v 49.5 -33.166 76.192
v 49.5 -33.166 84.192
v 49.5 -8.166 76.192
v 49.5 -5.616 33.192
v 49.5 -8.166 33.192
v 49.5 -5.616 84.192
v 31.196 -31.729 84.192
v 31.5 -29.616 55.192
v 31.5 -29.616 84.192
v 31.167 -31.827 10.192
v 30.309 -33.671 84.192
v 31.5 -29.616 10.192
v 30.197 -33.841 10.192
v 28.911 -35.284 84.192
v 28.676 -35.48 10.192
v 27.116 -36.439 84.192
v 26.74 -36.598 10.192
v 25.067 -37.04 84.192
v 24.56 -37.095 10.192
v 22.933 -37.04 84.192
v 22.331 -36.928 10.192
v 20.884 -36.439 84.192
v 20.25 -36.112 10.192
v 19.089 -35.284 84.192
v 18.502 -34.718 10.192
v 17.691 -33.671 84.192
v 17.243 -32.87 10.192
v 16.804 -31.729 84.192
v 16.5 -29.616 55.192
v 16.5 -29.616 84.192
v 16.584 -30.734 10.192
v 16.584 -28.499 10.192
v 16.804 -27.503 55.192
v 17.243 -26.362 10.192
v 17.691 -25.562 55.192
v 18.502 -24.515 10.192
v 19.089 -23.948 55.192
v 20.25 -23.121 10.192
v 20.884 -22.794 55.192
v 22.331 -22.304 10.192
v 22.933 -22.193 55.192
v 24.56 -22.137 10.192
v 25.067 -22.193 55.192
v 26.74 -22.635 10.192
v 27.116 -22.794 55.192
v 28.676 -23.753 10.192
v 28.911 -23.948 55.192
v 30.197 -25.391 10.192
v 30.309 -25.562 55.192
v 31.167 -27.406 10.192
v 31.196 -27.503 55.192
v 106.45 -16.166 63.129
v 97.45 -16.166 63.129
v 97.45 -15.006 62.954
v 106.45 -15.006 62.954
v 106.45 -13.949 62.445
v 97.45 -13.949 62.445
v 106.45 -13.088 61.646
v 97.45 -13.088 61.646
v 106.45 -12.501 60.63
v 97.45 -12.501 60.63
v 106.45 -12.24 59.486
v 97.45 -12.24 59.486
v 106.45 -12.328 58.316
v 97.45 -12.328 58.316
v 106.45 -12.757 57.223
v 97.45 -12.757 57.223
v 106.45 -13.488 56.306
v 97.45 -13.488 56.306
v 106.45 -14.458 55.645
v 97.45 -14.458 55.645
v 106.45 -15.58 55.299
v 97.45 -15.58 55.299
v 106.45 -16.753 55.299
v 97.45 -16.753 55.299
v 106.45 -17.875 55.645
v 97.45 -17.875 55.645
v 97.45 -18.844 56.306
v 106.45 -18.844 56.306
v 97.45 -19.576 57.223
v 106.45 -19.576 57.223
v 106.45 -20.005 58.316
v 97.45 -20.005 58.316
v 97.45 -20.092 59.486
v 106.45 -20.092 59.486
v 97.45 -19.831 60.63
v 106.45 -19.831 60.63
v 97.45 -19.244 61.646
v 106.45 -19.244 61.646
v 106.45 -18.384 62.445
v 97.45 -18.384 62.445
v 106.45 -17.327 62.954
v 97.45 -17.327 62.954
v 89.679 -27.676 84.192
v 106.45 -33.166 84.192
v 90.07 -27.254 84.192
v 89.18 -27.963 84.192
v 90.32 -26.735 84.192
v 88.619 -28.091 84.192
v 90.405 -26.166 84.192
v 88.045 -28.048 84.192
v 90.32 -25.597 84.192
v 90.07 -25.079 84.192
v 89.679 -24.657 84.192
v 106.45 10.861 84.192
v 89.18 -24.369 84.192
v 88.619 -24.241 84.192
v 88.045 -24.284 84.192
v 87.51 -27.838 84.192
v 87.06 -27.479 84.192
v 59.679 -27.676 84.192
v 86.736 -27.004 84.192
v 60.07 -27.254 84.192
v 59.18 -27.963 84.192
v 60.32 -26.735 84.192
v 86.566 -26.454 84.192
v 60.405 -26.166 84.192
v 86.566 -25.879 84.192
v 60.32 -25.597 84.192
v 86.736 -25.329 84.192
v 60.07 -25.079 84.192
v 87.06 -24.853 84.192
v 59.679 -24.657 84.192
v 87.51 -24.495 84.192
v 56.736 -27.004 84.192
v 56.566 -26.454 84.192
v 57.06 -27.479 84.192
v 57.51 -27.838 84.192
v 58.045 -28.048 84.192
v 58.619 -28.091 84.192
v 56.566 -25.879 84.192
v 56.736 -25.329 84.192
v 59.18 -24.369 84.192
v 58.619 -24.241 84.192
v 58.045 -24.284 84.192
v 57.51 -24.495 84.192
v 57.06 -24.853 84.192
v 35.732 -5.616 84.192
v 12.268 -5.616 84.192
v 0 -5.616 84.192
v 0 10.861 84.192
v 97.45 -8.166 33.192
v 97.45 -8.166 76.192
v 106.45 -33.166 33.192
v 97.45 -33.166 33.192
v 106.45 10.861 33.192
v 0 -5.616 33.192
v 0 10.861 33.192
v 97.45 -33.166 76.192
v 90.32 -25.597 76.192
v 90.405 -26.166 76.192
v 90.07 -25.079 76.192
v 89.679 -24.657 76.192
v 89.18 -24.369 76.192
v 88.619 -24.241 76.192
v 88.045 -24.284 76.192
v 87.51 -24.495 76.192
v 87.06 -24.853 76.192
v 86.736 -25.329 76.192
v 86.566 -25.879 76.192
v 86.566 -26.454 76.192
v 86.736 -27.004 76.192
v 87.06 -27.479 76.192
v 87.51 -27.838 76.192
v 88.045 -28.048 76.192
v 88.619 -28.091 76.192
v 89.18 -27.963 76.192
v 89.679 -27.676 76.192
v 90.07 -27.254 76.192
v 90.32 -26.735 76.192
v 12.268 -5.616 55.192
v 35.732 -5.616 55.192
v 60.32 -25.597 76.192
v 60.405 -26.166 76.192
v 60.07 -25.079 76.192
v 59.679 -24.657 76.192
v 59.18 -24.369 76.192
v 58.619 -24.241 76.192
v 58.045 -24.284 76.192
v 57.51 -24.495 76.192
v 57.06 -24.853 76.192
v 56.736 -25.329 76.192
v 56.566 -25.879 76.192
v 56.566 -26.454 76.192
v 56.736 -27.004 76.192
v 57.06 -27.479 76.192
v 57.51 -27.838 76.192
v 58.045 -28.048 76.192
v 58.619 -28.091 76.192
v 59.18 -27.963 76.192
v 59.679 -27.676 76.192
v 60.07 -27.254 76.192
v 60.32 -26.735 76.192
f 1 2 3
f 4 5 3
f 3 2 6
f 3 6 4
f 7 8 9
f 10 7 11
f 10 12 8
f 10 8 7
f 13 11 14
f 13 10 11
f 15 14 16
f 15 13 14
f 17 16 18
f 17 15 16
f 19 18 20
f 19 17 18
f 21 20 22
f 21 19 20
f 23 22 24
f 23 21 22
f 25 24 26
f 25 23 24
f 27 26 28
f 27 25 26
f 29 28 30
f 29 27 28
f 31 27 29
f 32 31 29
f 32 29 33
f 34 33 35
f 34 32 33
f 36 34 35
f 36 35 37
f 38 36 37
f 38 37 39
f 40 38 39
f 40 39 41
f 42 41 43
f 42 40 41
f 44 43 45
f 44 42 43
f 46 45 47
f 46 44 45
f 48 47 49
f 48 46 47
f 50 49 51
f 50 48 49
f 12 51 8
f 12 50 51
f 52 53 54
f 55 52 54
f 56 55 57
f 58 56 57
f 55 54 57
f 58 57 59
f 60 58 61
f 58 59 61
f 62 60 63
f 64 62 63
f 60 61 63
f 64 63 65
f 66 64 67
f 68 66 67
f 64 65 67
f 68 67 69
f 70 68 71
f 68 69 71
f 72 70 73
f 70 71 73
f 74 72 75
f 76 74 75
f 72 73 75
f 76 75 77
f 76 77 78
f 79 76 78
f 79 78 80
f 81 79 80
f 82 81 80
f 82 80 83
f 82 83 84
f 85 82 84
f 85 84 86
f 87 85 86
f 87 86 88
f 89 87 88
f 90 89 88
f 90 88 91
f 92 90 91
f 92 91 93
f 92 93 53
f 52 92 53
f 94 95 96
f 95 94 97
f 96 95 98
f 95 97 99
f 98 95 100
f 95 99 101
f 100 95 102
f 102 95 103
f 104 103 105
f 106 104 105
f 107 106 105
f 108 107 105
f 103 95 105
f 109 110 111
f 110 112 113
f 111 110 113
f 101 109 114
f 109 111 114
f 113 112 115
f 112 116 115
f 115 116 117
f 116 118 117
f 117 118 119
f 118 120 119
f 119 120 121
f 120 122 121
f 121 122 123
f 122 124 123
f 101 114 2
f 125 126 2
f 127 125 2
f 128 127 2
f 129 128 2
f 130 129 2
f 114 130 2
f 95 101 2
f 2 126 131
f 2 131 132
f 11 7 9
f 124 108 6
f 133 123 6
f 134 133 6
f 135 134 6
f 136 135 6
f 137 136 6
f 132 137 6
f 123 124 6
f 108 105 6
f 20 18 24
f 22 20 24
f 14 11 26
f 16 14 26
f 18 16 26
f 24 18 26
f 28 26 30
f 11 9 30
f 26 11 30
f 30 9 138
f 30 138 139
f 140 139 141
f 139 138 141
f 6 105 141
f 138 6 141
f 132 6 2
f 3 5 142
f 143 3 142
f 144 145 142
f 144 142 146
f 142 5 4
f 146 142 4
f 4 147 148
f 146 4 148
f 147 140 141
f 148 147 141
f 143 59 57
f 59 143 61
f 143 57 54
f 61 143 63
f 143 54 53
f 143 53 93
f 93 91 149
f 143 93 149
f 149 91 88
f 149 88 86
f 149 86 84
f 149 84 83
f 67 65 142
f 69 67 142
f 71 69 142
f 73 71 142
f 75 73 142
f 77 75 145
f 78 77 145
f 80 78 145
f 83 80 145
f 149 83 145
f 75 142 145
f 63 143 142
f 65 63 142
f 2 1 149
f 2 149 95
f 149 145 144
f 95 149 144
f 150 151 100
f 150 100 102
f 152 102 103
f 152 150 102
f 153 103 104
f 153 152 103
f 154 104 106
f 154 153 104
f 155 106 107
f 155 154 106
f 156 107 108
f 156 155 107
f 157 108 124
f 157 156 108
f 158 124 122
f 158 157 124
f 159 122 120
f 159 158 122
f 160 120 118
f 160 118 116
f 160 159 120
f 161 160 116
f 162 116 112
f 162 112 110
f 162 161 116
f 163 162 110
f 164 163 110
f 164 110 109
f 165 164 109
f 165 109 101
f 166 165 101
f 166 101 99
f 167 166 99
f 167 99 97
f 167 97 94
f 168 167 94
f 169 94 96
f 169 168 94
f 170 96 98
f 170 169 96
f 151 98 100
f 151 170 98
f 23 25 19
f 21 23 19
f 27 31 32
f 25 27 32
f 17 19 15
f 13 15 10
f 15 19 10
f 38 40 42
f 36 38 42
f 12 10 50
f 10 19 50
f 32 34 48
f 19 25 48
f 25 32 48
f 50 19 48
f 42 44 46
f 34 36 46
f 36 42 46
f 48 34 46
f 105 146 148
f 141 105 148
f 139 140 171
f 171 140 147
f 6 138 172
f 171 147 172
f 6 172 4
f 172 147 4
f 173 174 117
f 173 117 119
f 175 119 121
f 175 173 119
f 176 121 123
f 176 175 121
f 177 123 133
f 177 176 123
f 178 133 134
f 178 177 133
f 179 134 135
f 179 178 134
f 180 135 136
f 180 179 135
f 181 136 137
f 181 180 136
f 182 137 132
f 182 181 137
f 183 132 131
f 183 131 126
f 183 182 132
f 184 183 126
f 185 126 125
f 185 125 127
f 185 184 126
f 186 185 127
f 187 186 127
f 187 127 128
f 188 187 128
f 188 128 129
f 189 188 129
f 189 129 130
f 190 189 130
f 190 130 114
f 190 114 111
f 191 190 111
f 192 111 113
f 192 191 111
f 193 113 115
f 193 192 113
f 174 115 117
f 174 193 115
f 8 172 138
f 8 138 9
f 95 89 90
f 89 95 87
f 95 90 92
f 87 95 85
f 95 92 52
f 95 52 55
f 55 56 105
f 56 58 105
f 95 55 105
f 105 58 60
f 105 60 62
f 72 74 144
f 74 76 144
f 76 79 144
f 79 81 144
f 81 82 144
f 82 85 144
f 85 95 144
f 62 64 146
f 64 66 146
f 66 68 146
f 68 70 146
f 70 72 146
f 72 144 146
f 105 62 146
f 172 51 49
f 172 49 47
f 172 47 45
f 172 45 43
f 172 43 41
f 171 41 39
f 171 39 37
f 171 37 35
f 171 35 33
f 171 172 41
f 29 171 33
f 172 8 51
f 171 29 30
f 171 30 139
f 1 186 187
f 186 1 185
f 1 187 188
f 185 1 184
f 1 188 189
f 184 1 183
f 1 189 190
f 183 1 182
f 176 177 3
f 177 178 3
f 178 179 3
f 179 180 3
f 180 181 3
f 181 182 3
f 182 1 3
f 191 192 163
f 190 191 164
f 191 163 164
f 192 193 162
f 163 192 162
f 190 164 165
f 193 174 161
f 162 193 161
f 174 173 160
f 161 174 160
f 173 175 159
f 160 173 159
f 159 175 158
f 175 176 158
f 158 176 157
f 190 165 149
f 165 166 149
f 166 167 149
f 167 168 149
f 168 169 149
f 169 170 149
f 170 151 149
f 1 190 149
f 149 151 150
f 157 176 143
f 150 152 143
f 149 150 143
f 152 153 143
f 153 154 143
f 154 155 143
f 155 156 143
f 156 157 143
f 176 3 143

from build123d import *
from build123d.topology import SkipClean

# Parameters (mm, degrees)
SKETCH1_W             = 48
SKETCH1_H             = 53
BOSS_EXTRUDE1_DEPTH   = 10
SKETCH2_W             = 48
SKETCH2_H             = 5.616325
BOSS_EXTRUDE2_DEPTH   = 33.1917878
SKETCH4_W             = 4
SKETCH4_H             = 10
BOSS_EXTRUDE4_DEPTH   = 40
SKETCH5_W             = 48
SKETCH5_H             = 10.8609375
BOSS_EXTRUDE5_DEPTH   = 23.1917878
SKETCH6_W             = 48
SKETCH6_H             = 5
BOSS_EXTRUDE6_DEPTH   = 42.3
SKETCH7_W             = 12.8082122
SKETCH7_H             = 16.4772625
BOSS_EXTRUDE7_DEPTH   = 48
CUT_EXTRUDE1_REACH    = 84.426
SKETCH8_R             = 11.5
SKETCH8_R_2           = 2
FILLET1_R             = 10
FILLET2_R             = 4
SKETCH9_W             = 5
SKETCH9_H             = 16.4772625
BOSS_EXTRUDE9_DEPTH   = 48
CUT_EXTRUDE2_DEPTH    = 88.252507127
SKETCH11_W            = 51
SKETCH11_H            = 16.4772625
BOSS_EXTRUDE10_DEPTH  = 49.45
BOSS_EXTRUDE11_DEPTH  = 46
SKETCH16_W            = 47.95
SKETCH16_H            = 51
BOSS_EXTRUDE14_DEPTH  = 2.55
SKETCH14_W            = 5
SKETCH14_H            = 42.3
BOSS_EXTRUDE13_DEPTH  = 1.5
SKETCH17_W            = 51
SKETCH17_H            = 19.0272625
BOSS_EXTRUDE15_DEPTH  = 9
BOSS_EXTRUDE16_DEPTH  = 25
SKETCH19_R            = 1.9304
CUT_EXTRUDE3_DEPTH    = 125.404890183
MIRROR2_START         = 33.1917878
MIRROR2_DEPTH         = 51
MIRROR2_START_2       = 76.1917878
MIRROR2_2_OUTLINE_W   = 47.95
MIRROR2_2_OUTLINE_H   = 25
MIRROR2_2_OUTLINE_R   = 1.9304
MIRROR2_2_DEPTH       = 8
MIRROR2_3_OUTLINE_W   = 45
MIRROR2_3_OUTLINE_H   = 42.3
MIRROR2_3_OUTLINE_R   = 2
MIRROR2_3_OUTLINE_R_2 = 11.5
MIRROR2_3_DEPTH       = 5
SKETCH20_W            = 103.287975037
SKETCH20_H            = 97.84889924
CUT_EXTRUDE4_DEPTH    = 144.929961559
SKETCH21_W            = 49.5
SKETCH21_H            = 42.3
CUT_EXTRUDE5_DEPTH    = 128.391431036
SKETCH24_R            = 7.5
BOSS_EXTRUDE18_DEPTH  = 45
BOSS_EXTRUDE19_DEPTH  = 29
SKETCH26_R            = 3.937
CUT_EXTRUDE6_DEPTH    = 135.023808387


# Read off the part's stored shape, not the designer's step: Mirror2
with BuildPart() as part:
    # Sketch1 → Boss-Extrude1 (new body)
    with BuildSketch(Plane.XY):
        with Locations((24, 26.5)):
            Rectangle(SKETCH1_W, SKETCH1_H)
    extrude(amount=BOSS_EXTRUDE1_DEPTH)

    # Sketch2 → Boss-Extrude2 (add)
    with BuildSketch(Plane(origin=(0, 0, 0), x_dir=(-1, 0, 0), z_dir=(0, 0, -1))):
        with Locations((-24, -2.8081625)):
            Rectangle(SKETCH2_W, SKETCH2_H)
    extrude(amount=-BOSS_EXTRUDE2_DEPTH)

    # Sketch4 → Boss-Extrude4 (add)
    with BuildSketch(Plane.XY.offset(10)):
        with Locations((2, 48)):
            Rectangle(SKETCH4_W, SKETCH4_H)
        with Locations((46, 48)):
            Rectangle(SKETCH4_W, SKETCH4_H)
    extrude(amount=BOSS_EXTRUDE4_DEPTH)

    # Sketch5 → Boss-Extrude5 (add)
    with BuildSketch(Plane.XY.offset(10)):
        with Locations((24, 5.43046875)):
            Rectangle(SKETCH5_W, SKETCH5_H)
    extrude(amount=BOSS_EXTRUDE5_DEPTH)

    # Sketch6 → Boss-Extrude6 (add)
    with BuildSketch(Plane.XZ.offset(5.616325)):
        with Locations((24, 30.6917878)):
            Rectangle(SKETCH6_W, SKETCH6_H)
    extrude(amount=BOSS_EXTRUDE6_DEPTH)

    # Sketch7 → Boss-Extrude7 (add)
    with BuildSketch(Plane.ZY):
        with Locations((-6.4041061, 2.62230625)):
            Rectangle(SKETCH7_W, SKETCH7_H)
    extrude(amount=-BOSS_EXTRUDE7_DEPTH)

    # Sketch8 → Cut-Extrude1 (cut, up to next)
    with BuildSketch(Plane(origin=(0, 0, 28.1917878), x_dir=(-1, 0, 0), z_dir=(0, 0, -1)), mode=Mode.PRIVATE) as cut_extrude1_sk1:
        with Locations((-24, -26.616325)):
            Circle(SKETCH8_R)
    cut_extrude1_tool1 = extrude(cut_extrude1_sk1.sketch, amount=-CUT_EXTRUDE1_REACH, mode=Mode.PRIVATE) & part.part
    # Sketch8 → Cut-Extrude1 (cut, up to next)
    with BuildSketch(Plane(origin=(0, 0, 28.1917878), x_dir=(-1, 0, 0), z_dir=(0, 0, -1)), mode=Mode.PRIVATE) as cut_extrude1_sk2:
        with Locations((-39.5, -11.116325)):
            Circle(SKETCH8_R_2)
    cut_extrude1_tool2 = extrude(cut_extrude1_sk2.sketch, amount=-CUT_EXTRUDE1_REACH, mode=Mode.PRIVATE) & part.part
    # Sketch8 → Cut-Extrude1 (cut, up to next)
    with BuildSketch(Plane(origin=(0, 0, 28.1917878), x_dir=(-1, 0, 0), z_dir=(0, 0, -1)), mode=Mode.PRIVATE) as cut_extrude1_sk3:
        with Locations((-39.5, -42.116325)):
            Circle(SKETCH8_R_2)
    cut_extrude1_tool3 = extrude(cut_extrude1_sk3.sketch, amount=-CUT_EXTRUDE1_REACH, mode=Mode.PRIVATE) & part.part
    # Sketch8 → Cut-Extrude1 (cut, up to next)
    with BuildSketch(Plane(origin=(0, 0, 28.1917878), x_dir=(-1, 0, 0), z_dir=(0, 0, -1)), mode=Mode.PRIVATE) as cut_extrude1_sk4:
        with Locations((-8.5, -11.116325)):
            Circle(SKETCH8_R_2)
    cut_extrude1_tool4 = extrude(cut_extrude1_sk4.sketch, amount=-CUT_EXTRUDE1_REACH, mode=Mode.PRIVATE) & part.part
    # Sketch8 → Cut-Extrude1 (cut, up to next)
    with BuildSketch(Plane(origin=(0, 0, 28.1917878), x_dir=(-1, 0, 0), z_dir=(0, 0, -1)), mode=Mode.PRIVATE) as cut_extrude1_sk5:
        with Locations((-8.5, -42.116325)):
            Circle(SKETCH8_R_2)
    cut_extrude1_tool5 = extrude(cut_extrude1_sk5.sketch, amount=-CUT_EXTRUDE1_REACH, mode=Mode.PRIVATE) & part.part
    add(cut_extrude1_tool1.solids().sort_by_distance((24, -26.616325, 28.191788))[0], mode=Mode.SUBTRACT)
    add(cut_extrude1_tool2.solids().sort_by_distance((39.5, -11.116325, 28.191788))[0], mode=Mode.SUBTRACT)
    add(cut_extrude1_tool3.solids().sort_by_distance((39.5, -42.116325, 28.191788))[0], mode=Mode.SUBTRACT)
    add(cut_extrude1_tool4.solids().sort_by_distance((8.5, -11.116325, 28.191788))[0], mode=Mode.SUBTRACT)
    add(cut_extrude1_tool5.solids().sort_by_distance((8.5, -42.116325, 28.191788))[0], mode=Mode.SUBTRACT)

    # Fillet1
    fillet1_edges = [part.edges().sort_by_distance(p)[0] for p in [
        (24, 10.8609375, 0),
    ]]
    fillet(fillet1_edges, radius=FILLET1_R)

    # Fillet2
    fillet2_edges = [part.edges().sort_by_distance(p)[0] for p in [
        (2, 43, 10),
        (46, 43, 10),
    ]]
    fillet(fillet2_edges, radius=FILLET2_R)

    # Sketch9 → Boss-Extrude9 (add)
    with BuildSketch(Plane(origin=(48, 0, 0), x_dir=(0, 0, -1), z_dir=(1, 0, 0))):
        with Locations((15.3082122, 2.62230625)):
            Rectangle(SKETCH9_W, SKETCH9_H)
    extrude(amount=-BOSS_EXTRUDE9_DEPTH)

    # Sketch10 → Cut-Extrude2 (cut, through all)
    with BuildSketch(Plane(origin=(48, 0, 0), x_dir=(0, 0, -1), z_dir=(1, 0, 0))):
        Polygon((17.8082122, 10.8609375), (-33.1917878, 10.8609375), (-76.887145623, 43.902095521), (-50.794096938, 74.436514195), (27.207463492, 71.105486703), align=None)
    extrude(amount=-CUT_EXTRUDE2_DEPTH, mode=Mode.SUBTRACT)

    # Sketch11 → Boss-Extrude10 (add)
    with BuildSketch(Plane(origin=(48, 0, 0), x_dir=(0, 0, -1), z_dir=(1, 0, 0))):
        with Locations((-7.6917878, 2.62230625)):
            Rectangle(SKETCH11_W, SKETCH11_H)
    extrude(amount=BOSS_EXTRUDE10_DEPTH)

    # Sketch12 → Boss-Extrude11 (add)
    with BuildSketch(Plane(origin=(0, 0, 28.1917878), x_dir=(-1, 0, 0), z_dir=(0, 0, -1))):
        Polygon((-48, -47.916325), (-45, -47.916325), (-45, -5.616325), (-49.5, -5.616325), (-49.5, -47.916325), align=None)
    extrude(amount=BOSS_EXTRUDE11_DEPTH)

    # Sketch16 → Boss-Extrude14 (add)
    with BuildSketch(Plane.XZ.offset(5.616325)):
        with Locations((73.475, 7.6917878)):
            Rectangle(SKETCH16_W, SKETCH16_H)
    extrude(amount=BOSS_EXTRUDE14_DEPTH)

    # Sketch14 → Boss-Extrude13 (add)
    with BuildSketch(Plane(origin=(49.5, 0, 0), x_dir=(0, 0, -1), z_dir=(1, 0, 0))):
        with Locations((-30.6917878, -26.766325)):
            Rectangle(SKETCH14_W, SKETCH14_H)
    extrude(amount=-BOSS_EXTRUDE13_DEPTH)

    # Sketch17 → Boss-Extrude15 (add)
    with BuildSketch(Plane(origin=(97.45, 0, 0), x_dir=(0, 0, -1), z_dir=(1, 0, 0))):
        with Locations((-7.6917878, 1.34730625)):
            Rectangle(SKETCH17_W, SKETCH17_H)
    extrude(amount=BOSS_EXTRUDE15_DEPTH)

    # Sketch18 → Boss-Extrude16 (add)
    with BuildSketch(Plane.XZ.offset(8.166325)):
        Polygon((49.5, -17.8082122), (106.45, -17.8082122), (106.45, -9.8082122), (106.45, 33.1917878), (97.45, 33.1917878), (97.45, -9.8082122), (49.5, -9.8082122), align=None)
    extrude(amount=BOSS_EXTRUDE16_DEPTH)

    # Sketch19 → Cut-Extrude3 (cut, through all)
    with BuildSketch(Plane.XY.offset(-9.8082122)):
        with Locations((58.475, -26.166325)):
            Circle(SKETCH19_R)
        with Locations((88.475, -26.166325)):
            Circle(SKETCH19_R)
    extrude(amount=-CUT_EXTRUDE3_DEPTH, mode=Mode.SUBTRACT)

    # Mirror2 outline → Mirror2 (add)
    with BuildSketch(Plane.XY.offset(MIRROR2_START)):
        Polygon((49.5, -47.916325), (49.5, -8.166325), (97.45, -8.166325), (97.45, -33.166325), (106.45, -33.166325), (106.45, 10.8609375), (0, 10.8609375), (0, -5.616325), (45, -5.616325), (45, -47.916325), align=None)
    extrude(amount=MIRROR2_DEPTH)

    # Mirror2 2 outline → Mirror2 2 (add)
    with BuildSketch(Plane.XY.offset(MIRROR2_START_2)):
        with Locations((73.475, -20.666325)):
            Rectangle(MIRROR2_2_OUTLINE_W, MIRROR2_2_OUTLINE_H)
        with Locations((58.475, -26.166325)):
            Circle(MIRROR2_2_OUTLINE_R, mode=Mode.SUBTRACT)
        with Locations((88.475, -26.166325)):
            Circle(MIRROR2_2_OUTLINE_R, mode=Mode.SUBTRACT)
    extrude(amount=MIRROR2_2_DEPTH)

    # Mirror2 3 outline → Mirror2 3 (add)
    with SkipClean():  # the faces are left unmerged after this step: merging them gives an invalid solid
        with BuildSketch(Plane.XY.offset(MIRROR2_START)):
            with Locations((22.5, -26.766325)):
                Rectangle(MIRROR2_3_OUTLINE_W, MIRROR2_3_OUTLINE_H)
            with Locations((8.5, -42.116325)):
                Circle(MIRROR2_3_OUTLINE_R, mode=Mode.SUBTRACT)
            with Locations((39.5, -42.116325)):
                Circle(MIRROR2_3_OUTLINE_R, mode=Mode.SUBTRACT)
            with Locations((24, -26.616325)):
                Circle(MIRROR2_3_OUTLINE_R_2, mode=Mode.SUBTRACT)
            with Locations((8.5, -11.116325)):
                Circle(MIRROR2_3_OUTLINE_R, mode=Mode.SUBTRACT)
            with Locations((39.5, -11.116325)):
                Circle(MIRROR2_3_OUTLINE_R, mode=Mode.SUBTRACT)
        extrude(amount=MIRROR2_3_DEPTH)

    # Sketch20 → Cut-Extrude4 (cut, through all)
    with BuildSketch(Plane.ZY):
        with Locations((-18.452199719, -38.06351212)):
            Rectangle(SKETCH20_W, SKETCH20_H)
    extrude(amount=-CUT_EXTRUDE4_DEPTH, mode=Mode.SUBTRACT)

    # Sketch21 → Cut-Extrude5 (cut, through all)
    with BuildSketch(Plane.XY.offset(84.1917878)):
        with Locations((24.75, -26.766325)):
            Rectangle(SKETCH21_W, SKETCH21_H)
    extrude(amount=-CUT_EXTRUDE5_DEPTH, mode=Mode.SUBTRACT)



with BuildPart() as body_2:
    # Sketch24 → Boss-Extrude18 (new body)
    with BuildSketch(Plane.XY.offset(55.1917878)):
        with Locations((24, -29.616325)):
            Circle(SKETCH24_R)
    extrude(amount=-BOSS_EXTRUDE18_DEPTH)


with BuildPart() as part_1:
    add(part.part)

    add(body_2.part)  # Boss-Extrude19 merges body 2
    # Sketch25 → Boss-Extrude19 (add)
    with BuildSketch(Plane.XY.offset(55.1917878)):
        with BuildLine():
            Line((16.5, -29.616325), (12.268152463, -5.616325))
            Line((12.268152463, -5.616325), (35.731847537, -5.616325))
            Line((35.731847537, -5.616325), (31.5, -29.616325))
            ThreePointArc((31.5, -29.616325), (24, -37.116325), (16.5, -29.616325))
        make_face()
    extrude(amount=BOSS_EXTRUDE19_DEPTH)

    # Sketch26 → Cut-Extrude6 (cut, through all)
    with BuildSketch(Plane.ZY.offset(-97.45)):
        with Locations((59.1917878, -16.166325)):
            Circle(SKETCH26_R)
    extrude(amount=-CUT_EXTRUDE6_DEPTH, mode=Mode.SUBTRACT)


solid = part_1.part
